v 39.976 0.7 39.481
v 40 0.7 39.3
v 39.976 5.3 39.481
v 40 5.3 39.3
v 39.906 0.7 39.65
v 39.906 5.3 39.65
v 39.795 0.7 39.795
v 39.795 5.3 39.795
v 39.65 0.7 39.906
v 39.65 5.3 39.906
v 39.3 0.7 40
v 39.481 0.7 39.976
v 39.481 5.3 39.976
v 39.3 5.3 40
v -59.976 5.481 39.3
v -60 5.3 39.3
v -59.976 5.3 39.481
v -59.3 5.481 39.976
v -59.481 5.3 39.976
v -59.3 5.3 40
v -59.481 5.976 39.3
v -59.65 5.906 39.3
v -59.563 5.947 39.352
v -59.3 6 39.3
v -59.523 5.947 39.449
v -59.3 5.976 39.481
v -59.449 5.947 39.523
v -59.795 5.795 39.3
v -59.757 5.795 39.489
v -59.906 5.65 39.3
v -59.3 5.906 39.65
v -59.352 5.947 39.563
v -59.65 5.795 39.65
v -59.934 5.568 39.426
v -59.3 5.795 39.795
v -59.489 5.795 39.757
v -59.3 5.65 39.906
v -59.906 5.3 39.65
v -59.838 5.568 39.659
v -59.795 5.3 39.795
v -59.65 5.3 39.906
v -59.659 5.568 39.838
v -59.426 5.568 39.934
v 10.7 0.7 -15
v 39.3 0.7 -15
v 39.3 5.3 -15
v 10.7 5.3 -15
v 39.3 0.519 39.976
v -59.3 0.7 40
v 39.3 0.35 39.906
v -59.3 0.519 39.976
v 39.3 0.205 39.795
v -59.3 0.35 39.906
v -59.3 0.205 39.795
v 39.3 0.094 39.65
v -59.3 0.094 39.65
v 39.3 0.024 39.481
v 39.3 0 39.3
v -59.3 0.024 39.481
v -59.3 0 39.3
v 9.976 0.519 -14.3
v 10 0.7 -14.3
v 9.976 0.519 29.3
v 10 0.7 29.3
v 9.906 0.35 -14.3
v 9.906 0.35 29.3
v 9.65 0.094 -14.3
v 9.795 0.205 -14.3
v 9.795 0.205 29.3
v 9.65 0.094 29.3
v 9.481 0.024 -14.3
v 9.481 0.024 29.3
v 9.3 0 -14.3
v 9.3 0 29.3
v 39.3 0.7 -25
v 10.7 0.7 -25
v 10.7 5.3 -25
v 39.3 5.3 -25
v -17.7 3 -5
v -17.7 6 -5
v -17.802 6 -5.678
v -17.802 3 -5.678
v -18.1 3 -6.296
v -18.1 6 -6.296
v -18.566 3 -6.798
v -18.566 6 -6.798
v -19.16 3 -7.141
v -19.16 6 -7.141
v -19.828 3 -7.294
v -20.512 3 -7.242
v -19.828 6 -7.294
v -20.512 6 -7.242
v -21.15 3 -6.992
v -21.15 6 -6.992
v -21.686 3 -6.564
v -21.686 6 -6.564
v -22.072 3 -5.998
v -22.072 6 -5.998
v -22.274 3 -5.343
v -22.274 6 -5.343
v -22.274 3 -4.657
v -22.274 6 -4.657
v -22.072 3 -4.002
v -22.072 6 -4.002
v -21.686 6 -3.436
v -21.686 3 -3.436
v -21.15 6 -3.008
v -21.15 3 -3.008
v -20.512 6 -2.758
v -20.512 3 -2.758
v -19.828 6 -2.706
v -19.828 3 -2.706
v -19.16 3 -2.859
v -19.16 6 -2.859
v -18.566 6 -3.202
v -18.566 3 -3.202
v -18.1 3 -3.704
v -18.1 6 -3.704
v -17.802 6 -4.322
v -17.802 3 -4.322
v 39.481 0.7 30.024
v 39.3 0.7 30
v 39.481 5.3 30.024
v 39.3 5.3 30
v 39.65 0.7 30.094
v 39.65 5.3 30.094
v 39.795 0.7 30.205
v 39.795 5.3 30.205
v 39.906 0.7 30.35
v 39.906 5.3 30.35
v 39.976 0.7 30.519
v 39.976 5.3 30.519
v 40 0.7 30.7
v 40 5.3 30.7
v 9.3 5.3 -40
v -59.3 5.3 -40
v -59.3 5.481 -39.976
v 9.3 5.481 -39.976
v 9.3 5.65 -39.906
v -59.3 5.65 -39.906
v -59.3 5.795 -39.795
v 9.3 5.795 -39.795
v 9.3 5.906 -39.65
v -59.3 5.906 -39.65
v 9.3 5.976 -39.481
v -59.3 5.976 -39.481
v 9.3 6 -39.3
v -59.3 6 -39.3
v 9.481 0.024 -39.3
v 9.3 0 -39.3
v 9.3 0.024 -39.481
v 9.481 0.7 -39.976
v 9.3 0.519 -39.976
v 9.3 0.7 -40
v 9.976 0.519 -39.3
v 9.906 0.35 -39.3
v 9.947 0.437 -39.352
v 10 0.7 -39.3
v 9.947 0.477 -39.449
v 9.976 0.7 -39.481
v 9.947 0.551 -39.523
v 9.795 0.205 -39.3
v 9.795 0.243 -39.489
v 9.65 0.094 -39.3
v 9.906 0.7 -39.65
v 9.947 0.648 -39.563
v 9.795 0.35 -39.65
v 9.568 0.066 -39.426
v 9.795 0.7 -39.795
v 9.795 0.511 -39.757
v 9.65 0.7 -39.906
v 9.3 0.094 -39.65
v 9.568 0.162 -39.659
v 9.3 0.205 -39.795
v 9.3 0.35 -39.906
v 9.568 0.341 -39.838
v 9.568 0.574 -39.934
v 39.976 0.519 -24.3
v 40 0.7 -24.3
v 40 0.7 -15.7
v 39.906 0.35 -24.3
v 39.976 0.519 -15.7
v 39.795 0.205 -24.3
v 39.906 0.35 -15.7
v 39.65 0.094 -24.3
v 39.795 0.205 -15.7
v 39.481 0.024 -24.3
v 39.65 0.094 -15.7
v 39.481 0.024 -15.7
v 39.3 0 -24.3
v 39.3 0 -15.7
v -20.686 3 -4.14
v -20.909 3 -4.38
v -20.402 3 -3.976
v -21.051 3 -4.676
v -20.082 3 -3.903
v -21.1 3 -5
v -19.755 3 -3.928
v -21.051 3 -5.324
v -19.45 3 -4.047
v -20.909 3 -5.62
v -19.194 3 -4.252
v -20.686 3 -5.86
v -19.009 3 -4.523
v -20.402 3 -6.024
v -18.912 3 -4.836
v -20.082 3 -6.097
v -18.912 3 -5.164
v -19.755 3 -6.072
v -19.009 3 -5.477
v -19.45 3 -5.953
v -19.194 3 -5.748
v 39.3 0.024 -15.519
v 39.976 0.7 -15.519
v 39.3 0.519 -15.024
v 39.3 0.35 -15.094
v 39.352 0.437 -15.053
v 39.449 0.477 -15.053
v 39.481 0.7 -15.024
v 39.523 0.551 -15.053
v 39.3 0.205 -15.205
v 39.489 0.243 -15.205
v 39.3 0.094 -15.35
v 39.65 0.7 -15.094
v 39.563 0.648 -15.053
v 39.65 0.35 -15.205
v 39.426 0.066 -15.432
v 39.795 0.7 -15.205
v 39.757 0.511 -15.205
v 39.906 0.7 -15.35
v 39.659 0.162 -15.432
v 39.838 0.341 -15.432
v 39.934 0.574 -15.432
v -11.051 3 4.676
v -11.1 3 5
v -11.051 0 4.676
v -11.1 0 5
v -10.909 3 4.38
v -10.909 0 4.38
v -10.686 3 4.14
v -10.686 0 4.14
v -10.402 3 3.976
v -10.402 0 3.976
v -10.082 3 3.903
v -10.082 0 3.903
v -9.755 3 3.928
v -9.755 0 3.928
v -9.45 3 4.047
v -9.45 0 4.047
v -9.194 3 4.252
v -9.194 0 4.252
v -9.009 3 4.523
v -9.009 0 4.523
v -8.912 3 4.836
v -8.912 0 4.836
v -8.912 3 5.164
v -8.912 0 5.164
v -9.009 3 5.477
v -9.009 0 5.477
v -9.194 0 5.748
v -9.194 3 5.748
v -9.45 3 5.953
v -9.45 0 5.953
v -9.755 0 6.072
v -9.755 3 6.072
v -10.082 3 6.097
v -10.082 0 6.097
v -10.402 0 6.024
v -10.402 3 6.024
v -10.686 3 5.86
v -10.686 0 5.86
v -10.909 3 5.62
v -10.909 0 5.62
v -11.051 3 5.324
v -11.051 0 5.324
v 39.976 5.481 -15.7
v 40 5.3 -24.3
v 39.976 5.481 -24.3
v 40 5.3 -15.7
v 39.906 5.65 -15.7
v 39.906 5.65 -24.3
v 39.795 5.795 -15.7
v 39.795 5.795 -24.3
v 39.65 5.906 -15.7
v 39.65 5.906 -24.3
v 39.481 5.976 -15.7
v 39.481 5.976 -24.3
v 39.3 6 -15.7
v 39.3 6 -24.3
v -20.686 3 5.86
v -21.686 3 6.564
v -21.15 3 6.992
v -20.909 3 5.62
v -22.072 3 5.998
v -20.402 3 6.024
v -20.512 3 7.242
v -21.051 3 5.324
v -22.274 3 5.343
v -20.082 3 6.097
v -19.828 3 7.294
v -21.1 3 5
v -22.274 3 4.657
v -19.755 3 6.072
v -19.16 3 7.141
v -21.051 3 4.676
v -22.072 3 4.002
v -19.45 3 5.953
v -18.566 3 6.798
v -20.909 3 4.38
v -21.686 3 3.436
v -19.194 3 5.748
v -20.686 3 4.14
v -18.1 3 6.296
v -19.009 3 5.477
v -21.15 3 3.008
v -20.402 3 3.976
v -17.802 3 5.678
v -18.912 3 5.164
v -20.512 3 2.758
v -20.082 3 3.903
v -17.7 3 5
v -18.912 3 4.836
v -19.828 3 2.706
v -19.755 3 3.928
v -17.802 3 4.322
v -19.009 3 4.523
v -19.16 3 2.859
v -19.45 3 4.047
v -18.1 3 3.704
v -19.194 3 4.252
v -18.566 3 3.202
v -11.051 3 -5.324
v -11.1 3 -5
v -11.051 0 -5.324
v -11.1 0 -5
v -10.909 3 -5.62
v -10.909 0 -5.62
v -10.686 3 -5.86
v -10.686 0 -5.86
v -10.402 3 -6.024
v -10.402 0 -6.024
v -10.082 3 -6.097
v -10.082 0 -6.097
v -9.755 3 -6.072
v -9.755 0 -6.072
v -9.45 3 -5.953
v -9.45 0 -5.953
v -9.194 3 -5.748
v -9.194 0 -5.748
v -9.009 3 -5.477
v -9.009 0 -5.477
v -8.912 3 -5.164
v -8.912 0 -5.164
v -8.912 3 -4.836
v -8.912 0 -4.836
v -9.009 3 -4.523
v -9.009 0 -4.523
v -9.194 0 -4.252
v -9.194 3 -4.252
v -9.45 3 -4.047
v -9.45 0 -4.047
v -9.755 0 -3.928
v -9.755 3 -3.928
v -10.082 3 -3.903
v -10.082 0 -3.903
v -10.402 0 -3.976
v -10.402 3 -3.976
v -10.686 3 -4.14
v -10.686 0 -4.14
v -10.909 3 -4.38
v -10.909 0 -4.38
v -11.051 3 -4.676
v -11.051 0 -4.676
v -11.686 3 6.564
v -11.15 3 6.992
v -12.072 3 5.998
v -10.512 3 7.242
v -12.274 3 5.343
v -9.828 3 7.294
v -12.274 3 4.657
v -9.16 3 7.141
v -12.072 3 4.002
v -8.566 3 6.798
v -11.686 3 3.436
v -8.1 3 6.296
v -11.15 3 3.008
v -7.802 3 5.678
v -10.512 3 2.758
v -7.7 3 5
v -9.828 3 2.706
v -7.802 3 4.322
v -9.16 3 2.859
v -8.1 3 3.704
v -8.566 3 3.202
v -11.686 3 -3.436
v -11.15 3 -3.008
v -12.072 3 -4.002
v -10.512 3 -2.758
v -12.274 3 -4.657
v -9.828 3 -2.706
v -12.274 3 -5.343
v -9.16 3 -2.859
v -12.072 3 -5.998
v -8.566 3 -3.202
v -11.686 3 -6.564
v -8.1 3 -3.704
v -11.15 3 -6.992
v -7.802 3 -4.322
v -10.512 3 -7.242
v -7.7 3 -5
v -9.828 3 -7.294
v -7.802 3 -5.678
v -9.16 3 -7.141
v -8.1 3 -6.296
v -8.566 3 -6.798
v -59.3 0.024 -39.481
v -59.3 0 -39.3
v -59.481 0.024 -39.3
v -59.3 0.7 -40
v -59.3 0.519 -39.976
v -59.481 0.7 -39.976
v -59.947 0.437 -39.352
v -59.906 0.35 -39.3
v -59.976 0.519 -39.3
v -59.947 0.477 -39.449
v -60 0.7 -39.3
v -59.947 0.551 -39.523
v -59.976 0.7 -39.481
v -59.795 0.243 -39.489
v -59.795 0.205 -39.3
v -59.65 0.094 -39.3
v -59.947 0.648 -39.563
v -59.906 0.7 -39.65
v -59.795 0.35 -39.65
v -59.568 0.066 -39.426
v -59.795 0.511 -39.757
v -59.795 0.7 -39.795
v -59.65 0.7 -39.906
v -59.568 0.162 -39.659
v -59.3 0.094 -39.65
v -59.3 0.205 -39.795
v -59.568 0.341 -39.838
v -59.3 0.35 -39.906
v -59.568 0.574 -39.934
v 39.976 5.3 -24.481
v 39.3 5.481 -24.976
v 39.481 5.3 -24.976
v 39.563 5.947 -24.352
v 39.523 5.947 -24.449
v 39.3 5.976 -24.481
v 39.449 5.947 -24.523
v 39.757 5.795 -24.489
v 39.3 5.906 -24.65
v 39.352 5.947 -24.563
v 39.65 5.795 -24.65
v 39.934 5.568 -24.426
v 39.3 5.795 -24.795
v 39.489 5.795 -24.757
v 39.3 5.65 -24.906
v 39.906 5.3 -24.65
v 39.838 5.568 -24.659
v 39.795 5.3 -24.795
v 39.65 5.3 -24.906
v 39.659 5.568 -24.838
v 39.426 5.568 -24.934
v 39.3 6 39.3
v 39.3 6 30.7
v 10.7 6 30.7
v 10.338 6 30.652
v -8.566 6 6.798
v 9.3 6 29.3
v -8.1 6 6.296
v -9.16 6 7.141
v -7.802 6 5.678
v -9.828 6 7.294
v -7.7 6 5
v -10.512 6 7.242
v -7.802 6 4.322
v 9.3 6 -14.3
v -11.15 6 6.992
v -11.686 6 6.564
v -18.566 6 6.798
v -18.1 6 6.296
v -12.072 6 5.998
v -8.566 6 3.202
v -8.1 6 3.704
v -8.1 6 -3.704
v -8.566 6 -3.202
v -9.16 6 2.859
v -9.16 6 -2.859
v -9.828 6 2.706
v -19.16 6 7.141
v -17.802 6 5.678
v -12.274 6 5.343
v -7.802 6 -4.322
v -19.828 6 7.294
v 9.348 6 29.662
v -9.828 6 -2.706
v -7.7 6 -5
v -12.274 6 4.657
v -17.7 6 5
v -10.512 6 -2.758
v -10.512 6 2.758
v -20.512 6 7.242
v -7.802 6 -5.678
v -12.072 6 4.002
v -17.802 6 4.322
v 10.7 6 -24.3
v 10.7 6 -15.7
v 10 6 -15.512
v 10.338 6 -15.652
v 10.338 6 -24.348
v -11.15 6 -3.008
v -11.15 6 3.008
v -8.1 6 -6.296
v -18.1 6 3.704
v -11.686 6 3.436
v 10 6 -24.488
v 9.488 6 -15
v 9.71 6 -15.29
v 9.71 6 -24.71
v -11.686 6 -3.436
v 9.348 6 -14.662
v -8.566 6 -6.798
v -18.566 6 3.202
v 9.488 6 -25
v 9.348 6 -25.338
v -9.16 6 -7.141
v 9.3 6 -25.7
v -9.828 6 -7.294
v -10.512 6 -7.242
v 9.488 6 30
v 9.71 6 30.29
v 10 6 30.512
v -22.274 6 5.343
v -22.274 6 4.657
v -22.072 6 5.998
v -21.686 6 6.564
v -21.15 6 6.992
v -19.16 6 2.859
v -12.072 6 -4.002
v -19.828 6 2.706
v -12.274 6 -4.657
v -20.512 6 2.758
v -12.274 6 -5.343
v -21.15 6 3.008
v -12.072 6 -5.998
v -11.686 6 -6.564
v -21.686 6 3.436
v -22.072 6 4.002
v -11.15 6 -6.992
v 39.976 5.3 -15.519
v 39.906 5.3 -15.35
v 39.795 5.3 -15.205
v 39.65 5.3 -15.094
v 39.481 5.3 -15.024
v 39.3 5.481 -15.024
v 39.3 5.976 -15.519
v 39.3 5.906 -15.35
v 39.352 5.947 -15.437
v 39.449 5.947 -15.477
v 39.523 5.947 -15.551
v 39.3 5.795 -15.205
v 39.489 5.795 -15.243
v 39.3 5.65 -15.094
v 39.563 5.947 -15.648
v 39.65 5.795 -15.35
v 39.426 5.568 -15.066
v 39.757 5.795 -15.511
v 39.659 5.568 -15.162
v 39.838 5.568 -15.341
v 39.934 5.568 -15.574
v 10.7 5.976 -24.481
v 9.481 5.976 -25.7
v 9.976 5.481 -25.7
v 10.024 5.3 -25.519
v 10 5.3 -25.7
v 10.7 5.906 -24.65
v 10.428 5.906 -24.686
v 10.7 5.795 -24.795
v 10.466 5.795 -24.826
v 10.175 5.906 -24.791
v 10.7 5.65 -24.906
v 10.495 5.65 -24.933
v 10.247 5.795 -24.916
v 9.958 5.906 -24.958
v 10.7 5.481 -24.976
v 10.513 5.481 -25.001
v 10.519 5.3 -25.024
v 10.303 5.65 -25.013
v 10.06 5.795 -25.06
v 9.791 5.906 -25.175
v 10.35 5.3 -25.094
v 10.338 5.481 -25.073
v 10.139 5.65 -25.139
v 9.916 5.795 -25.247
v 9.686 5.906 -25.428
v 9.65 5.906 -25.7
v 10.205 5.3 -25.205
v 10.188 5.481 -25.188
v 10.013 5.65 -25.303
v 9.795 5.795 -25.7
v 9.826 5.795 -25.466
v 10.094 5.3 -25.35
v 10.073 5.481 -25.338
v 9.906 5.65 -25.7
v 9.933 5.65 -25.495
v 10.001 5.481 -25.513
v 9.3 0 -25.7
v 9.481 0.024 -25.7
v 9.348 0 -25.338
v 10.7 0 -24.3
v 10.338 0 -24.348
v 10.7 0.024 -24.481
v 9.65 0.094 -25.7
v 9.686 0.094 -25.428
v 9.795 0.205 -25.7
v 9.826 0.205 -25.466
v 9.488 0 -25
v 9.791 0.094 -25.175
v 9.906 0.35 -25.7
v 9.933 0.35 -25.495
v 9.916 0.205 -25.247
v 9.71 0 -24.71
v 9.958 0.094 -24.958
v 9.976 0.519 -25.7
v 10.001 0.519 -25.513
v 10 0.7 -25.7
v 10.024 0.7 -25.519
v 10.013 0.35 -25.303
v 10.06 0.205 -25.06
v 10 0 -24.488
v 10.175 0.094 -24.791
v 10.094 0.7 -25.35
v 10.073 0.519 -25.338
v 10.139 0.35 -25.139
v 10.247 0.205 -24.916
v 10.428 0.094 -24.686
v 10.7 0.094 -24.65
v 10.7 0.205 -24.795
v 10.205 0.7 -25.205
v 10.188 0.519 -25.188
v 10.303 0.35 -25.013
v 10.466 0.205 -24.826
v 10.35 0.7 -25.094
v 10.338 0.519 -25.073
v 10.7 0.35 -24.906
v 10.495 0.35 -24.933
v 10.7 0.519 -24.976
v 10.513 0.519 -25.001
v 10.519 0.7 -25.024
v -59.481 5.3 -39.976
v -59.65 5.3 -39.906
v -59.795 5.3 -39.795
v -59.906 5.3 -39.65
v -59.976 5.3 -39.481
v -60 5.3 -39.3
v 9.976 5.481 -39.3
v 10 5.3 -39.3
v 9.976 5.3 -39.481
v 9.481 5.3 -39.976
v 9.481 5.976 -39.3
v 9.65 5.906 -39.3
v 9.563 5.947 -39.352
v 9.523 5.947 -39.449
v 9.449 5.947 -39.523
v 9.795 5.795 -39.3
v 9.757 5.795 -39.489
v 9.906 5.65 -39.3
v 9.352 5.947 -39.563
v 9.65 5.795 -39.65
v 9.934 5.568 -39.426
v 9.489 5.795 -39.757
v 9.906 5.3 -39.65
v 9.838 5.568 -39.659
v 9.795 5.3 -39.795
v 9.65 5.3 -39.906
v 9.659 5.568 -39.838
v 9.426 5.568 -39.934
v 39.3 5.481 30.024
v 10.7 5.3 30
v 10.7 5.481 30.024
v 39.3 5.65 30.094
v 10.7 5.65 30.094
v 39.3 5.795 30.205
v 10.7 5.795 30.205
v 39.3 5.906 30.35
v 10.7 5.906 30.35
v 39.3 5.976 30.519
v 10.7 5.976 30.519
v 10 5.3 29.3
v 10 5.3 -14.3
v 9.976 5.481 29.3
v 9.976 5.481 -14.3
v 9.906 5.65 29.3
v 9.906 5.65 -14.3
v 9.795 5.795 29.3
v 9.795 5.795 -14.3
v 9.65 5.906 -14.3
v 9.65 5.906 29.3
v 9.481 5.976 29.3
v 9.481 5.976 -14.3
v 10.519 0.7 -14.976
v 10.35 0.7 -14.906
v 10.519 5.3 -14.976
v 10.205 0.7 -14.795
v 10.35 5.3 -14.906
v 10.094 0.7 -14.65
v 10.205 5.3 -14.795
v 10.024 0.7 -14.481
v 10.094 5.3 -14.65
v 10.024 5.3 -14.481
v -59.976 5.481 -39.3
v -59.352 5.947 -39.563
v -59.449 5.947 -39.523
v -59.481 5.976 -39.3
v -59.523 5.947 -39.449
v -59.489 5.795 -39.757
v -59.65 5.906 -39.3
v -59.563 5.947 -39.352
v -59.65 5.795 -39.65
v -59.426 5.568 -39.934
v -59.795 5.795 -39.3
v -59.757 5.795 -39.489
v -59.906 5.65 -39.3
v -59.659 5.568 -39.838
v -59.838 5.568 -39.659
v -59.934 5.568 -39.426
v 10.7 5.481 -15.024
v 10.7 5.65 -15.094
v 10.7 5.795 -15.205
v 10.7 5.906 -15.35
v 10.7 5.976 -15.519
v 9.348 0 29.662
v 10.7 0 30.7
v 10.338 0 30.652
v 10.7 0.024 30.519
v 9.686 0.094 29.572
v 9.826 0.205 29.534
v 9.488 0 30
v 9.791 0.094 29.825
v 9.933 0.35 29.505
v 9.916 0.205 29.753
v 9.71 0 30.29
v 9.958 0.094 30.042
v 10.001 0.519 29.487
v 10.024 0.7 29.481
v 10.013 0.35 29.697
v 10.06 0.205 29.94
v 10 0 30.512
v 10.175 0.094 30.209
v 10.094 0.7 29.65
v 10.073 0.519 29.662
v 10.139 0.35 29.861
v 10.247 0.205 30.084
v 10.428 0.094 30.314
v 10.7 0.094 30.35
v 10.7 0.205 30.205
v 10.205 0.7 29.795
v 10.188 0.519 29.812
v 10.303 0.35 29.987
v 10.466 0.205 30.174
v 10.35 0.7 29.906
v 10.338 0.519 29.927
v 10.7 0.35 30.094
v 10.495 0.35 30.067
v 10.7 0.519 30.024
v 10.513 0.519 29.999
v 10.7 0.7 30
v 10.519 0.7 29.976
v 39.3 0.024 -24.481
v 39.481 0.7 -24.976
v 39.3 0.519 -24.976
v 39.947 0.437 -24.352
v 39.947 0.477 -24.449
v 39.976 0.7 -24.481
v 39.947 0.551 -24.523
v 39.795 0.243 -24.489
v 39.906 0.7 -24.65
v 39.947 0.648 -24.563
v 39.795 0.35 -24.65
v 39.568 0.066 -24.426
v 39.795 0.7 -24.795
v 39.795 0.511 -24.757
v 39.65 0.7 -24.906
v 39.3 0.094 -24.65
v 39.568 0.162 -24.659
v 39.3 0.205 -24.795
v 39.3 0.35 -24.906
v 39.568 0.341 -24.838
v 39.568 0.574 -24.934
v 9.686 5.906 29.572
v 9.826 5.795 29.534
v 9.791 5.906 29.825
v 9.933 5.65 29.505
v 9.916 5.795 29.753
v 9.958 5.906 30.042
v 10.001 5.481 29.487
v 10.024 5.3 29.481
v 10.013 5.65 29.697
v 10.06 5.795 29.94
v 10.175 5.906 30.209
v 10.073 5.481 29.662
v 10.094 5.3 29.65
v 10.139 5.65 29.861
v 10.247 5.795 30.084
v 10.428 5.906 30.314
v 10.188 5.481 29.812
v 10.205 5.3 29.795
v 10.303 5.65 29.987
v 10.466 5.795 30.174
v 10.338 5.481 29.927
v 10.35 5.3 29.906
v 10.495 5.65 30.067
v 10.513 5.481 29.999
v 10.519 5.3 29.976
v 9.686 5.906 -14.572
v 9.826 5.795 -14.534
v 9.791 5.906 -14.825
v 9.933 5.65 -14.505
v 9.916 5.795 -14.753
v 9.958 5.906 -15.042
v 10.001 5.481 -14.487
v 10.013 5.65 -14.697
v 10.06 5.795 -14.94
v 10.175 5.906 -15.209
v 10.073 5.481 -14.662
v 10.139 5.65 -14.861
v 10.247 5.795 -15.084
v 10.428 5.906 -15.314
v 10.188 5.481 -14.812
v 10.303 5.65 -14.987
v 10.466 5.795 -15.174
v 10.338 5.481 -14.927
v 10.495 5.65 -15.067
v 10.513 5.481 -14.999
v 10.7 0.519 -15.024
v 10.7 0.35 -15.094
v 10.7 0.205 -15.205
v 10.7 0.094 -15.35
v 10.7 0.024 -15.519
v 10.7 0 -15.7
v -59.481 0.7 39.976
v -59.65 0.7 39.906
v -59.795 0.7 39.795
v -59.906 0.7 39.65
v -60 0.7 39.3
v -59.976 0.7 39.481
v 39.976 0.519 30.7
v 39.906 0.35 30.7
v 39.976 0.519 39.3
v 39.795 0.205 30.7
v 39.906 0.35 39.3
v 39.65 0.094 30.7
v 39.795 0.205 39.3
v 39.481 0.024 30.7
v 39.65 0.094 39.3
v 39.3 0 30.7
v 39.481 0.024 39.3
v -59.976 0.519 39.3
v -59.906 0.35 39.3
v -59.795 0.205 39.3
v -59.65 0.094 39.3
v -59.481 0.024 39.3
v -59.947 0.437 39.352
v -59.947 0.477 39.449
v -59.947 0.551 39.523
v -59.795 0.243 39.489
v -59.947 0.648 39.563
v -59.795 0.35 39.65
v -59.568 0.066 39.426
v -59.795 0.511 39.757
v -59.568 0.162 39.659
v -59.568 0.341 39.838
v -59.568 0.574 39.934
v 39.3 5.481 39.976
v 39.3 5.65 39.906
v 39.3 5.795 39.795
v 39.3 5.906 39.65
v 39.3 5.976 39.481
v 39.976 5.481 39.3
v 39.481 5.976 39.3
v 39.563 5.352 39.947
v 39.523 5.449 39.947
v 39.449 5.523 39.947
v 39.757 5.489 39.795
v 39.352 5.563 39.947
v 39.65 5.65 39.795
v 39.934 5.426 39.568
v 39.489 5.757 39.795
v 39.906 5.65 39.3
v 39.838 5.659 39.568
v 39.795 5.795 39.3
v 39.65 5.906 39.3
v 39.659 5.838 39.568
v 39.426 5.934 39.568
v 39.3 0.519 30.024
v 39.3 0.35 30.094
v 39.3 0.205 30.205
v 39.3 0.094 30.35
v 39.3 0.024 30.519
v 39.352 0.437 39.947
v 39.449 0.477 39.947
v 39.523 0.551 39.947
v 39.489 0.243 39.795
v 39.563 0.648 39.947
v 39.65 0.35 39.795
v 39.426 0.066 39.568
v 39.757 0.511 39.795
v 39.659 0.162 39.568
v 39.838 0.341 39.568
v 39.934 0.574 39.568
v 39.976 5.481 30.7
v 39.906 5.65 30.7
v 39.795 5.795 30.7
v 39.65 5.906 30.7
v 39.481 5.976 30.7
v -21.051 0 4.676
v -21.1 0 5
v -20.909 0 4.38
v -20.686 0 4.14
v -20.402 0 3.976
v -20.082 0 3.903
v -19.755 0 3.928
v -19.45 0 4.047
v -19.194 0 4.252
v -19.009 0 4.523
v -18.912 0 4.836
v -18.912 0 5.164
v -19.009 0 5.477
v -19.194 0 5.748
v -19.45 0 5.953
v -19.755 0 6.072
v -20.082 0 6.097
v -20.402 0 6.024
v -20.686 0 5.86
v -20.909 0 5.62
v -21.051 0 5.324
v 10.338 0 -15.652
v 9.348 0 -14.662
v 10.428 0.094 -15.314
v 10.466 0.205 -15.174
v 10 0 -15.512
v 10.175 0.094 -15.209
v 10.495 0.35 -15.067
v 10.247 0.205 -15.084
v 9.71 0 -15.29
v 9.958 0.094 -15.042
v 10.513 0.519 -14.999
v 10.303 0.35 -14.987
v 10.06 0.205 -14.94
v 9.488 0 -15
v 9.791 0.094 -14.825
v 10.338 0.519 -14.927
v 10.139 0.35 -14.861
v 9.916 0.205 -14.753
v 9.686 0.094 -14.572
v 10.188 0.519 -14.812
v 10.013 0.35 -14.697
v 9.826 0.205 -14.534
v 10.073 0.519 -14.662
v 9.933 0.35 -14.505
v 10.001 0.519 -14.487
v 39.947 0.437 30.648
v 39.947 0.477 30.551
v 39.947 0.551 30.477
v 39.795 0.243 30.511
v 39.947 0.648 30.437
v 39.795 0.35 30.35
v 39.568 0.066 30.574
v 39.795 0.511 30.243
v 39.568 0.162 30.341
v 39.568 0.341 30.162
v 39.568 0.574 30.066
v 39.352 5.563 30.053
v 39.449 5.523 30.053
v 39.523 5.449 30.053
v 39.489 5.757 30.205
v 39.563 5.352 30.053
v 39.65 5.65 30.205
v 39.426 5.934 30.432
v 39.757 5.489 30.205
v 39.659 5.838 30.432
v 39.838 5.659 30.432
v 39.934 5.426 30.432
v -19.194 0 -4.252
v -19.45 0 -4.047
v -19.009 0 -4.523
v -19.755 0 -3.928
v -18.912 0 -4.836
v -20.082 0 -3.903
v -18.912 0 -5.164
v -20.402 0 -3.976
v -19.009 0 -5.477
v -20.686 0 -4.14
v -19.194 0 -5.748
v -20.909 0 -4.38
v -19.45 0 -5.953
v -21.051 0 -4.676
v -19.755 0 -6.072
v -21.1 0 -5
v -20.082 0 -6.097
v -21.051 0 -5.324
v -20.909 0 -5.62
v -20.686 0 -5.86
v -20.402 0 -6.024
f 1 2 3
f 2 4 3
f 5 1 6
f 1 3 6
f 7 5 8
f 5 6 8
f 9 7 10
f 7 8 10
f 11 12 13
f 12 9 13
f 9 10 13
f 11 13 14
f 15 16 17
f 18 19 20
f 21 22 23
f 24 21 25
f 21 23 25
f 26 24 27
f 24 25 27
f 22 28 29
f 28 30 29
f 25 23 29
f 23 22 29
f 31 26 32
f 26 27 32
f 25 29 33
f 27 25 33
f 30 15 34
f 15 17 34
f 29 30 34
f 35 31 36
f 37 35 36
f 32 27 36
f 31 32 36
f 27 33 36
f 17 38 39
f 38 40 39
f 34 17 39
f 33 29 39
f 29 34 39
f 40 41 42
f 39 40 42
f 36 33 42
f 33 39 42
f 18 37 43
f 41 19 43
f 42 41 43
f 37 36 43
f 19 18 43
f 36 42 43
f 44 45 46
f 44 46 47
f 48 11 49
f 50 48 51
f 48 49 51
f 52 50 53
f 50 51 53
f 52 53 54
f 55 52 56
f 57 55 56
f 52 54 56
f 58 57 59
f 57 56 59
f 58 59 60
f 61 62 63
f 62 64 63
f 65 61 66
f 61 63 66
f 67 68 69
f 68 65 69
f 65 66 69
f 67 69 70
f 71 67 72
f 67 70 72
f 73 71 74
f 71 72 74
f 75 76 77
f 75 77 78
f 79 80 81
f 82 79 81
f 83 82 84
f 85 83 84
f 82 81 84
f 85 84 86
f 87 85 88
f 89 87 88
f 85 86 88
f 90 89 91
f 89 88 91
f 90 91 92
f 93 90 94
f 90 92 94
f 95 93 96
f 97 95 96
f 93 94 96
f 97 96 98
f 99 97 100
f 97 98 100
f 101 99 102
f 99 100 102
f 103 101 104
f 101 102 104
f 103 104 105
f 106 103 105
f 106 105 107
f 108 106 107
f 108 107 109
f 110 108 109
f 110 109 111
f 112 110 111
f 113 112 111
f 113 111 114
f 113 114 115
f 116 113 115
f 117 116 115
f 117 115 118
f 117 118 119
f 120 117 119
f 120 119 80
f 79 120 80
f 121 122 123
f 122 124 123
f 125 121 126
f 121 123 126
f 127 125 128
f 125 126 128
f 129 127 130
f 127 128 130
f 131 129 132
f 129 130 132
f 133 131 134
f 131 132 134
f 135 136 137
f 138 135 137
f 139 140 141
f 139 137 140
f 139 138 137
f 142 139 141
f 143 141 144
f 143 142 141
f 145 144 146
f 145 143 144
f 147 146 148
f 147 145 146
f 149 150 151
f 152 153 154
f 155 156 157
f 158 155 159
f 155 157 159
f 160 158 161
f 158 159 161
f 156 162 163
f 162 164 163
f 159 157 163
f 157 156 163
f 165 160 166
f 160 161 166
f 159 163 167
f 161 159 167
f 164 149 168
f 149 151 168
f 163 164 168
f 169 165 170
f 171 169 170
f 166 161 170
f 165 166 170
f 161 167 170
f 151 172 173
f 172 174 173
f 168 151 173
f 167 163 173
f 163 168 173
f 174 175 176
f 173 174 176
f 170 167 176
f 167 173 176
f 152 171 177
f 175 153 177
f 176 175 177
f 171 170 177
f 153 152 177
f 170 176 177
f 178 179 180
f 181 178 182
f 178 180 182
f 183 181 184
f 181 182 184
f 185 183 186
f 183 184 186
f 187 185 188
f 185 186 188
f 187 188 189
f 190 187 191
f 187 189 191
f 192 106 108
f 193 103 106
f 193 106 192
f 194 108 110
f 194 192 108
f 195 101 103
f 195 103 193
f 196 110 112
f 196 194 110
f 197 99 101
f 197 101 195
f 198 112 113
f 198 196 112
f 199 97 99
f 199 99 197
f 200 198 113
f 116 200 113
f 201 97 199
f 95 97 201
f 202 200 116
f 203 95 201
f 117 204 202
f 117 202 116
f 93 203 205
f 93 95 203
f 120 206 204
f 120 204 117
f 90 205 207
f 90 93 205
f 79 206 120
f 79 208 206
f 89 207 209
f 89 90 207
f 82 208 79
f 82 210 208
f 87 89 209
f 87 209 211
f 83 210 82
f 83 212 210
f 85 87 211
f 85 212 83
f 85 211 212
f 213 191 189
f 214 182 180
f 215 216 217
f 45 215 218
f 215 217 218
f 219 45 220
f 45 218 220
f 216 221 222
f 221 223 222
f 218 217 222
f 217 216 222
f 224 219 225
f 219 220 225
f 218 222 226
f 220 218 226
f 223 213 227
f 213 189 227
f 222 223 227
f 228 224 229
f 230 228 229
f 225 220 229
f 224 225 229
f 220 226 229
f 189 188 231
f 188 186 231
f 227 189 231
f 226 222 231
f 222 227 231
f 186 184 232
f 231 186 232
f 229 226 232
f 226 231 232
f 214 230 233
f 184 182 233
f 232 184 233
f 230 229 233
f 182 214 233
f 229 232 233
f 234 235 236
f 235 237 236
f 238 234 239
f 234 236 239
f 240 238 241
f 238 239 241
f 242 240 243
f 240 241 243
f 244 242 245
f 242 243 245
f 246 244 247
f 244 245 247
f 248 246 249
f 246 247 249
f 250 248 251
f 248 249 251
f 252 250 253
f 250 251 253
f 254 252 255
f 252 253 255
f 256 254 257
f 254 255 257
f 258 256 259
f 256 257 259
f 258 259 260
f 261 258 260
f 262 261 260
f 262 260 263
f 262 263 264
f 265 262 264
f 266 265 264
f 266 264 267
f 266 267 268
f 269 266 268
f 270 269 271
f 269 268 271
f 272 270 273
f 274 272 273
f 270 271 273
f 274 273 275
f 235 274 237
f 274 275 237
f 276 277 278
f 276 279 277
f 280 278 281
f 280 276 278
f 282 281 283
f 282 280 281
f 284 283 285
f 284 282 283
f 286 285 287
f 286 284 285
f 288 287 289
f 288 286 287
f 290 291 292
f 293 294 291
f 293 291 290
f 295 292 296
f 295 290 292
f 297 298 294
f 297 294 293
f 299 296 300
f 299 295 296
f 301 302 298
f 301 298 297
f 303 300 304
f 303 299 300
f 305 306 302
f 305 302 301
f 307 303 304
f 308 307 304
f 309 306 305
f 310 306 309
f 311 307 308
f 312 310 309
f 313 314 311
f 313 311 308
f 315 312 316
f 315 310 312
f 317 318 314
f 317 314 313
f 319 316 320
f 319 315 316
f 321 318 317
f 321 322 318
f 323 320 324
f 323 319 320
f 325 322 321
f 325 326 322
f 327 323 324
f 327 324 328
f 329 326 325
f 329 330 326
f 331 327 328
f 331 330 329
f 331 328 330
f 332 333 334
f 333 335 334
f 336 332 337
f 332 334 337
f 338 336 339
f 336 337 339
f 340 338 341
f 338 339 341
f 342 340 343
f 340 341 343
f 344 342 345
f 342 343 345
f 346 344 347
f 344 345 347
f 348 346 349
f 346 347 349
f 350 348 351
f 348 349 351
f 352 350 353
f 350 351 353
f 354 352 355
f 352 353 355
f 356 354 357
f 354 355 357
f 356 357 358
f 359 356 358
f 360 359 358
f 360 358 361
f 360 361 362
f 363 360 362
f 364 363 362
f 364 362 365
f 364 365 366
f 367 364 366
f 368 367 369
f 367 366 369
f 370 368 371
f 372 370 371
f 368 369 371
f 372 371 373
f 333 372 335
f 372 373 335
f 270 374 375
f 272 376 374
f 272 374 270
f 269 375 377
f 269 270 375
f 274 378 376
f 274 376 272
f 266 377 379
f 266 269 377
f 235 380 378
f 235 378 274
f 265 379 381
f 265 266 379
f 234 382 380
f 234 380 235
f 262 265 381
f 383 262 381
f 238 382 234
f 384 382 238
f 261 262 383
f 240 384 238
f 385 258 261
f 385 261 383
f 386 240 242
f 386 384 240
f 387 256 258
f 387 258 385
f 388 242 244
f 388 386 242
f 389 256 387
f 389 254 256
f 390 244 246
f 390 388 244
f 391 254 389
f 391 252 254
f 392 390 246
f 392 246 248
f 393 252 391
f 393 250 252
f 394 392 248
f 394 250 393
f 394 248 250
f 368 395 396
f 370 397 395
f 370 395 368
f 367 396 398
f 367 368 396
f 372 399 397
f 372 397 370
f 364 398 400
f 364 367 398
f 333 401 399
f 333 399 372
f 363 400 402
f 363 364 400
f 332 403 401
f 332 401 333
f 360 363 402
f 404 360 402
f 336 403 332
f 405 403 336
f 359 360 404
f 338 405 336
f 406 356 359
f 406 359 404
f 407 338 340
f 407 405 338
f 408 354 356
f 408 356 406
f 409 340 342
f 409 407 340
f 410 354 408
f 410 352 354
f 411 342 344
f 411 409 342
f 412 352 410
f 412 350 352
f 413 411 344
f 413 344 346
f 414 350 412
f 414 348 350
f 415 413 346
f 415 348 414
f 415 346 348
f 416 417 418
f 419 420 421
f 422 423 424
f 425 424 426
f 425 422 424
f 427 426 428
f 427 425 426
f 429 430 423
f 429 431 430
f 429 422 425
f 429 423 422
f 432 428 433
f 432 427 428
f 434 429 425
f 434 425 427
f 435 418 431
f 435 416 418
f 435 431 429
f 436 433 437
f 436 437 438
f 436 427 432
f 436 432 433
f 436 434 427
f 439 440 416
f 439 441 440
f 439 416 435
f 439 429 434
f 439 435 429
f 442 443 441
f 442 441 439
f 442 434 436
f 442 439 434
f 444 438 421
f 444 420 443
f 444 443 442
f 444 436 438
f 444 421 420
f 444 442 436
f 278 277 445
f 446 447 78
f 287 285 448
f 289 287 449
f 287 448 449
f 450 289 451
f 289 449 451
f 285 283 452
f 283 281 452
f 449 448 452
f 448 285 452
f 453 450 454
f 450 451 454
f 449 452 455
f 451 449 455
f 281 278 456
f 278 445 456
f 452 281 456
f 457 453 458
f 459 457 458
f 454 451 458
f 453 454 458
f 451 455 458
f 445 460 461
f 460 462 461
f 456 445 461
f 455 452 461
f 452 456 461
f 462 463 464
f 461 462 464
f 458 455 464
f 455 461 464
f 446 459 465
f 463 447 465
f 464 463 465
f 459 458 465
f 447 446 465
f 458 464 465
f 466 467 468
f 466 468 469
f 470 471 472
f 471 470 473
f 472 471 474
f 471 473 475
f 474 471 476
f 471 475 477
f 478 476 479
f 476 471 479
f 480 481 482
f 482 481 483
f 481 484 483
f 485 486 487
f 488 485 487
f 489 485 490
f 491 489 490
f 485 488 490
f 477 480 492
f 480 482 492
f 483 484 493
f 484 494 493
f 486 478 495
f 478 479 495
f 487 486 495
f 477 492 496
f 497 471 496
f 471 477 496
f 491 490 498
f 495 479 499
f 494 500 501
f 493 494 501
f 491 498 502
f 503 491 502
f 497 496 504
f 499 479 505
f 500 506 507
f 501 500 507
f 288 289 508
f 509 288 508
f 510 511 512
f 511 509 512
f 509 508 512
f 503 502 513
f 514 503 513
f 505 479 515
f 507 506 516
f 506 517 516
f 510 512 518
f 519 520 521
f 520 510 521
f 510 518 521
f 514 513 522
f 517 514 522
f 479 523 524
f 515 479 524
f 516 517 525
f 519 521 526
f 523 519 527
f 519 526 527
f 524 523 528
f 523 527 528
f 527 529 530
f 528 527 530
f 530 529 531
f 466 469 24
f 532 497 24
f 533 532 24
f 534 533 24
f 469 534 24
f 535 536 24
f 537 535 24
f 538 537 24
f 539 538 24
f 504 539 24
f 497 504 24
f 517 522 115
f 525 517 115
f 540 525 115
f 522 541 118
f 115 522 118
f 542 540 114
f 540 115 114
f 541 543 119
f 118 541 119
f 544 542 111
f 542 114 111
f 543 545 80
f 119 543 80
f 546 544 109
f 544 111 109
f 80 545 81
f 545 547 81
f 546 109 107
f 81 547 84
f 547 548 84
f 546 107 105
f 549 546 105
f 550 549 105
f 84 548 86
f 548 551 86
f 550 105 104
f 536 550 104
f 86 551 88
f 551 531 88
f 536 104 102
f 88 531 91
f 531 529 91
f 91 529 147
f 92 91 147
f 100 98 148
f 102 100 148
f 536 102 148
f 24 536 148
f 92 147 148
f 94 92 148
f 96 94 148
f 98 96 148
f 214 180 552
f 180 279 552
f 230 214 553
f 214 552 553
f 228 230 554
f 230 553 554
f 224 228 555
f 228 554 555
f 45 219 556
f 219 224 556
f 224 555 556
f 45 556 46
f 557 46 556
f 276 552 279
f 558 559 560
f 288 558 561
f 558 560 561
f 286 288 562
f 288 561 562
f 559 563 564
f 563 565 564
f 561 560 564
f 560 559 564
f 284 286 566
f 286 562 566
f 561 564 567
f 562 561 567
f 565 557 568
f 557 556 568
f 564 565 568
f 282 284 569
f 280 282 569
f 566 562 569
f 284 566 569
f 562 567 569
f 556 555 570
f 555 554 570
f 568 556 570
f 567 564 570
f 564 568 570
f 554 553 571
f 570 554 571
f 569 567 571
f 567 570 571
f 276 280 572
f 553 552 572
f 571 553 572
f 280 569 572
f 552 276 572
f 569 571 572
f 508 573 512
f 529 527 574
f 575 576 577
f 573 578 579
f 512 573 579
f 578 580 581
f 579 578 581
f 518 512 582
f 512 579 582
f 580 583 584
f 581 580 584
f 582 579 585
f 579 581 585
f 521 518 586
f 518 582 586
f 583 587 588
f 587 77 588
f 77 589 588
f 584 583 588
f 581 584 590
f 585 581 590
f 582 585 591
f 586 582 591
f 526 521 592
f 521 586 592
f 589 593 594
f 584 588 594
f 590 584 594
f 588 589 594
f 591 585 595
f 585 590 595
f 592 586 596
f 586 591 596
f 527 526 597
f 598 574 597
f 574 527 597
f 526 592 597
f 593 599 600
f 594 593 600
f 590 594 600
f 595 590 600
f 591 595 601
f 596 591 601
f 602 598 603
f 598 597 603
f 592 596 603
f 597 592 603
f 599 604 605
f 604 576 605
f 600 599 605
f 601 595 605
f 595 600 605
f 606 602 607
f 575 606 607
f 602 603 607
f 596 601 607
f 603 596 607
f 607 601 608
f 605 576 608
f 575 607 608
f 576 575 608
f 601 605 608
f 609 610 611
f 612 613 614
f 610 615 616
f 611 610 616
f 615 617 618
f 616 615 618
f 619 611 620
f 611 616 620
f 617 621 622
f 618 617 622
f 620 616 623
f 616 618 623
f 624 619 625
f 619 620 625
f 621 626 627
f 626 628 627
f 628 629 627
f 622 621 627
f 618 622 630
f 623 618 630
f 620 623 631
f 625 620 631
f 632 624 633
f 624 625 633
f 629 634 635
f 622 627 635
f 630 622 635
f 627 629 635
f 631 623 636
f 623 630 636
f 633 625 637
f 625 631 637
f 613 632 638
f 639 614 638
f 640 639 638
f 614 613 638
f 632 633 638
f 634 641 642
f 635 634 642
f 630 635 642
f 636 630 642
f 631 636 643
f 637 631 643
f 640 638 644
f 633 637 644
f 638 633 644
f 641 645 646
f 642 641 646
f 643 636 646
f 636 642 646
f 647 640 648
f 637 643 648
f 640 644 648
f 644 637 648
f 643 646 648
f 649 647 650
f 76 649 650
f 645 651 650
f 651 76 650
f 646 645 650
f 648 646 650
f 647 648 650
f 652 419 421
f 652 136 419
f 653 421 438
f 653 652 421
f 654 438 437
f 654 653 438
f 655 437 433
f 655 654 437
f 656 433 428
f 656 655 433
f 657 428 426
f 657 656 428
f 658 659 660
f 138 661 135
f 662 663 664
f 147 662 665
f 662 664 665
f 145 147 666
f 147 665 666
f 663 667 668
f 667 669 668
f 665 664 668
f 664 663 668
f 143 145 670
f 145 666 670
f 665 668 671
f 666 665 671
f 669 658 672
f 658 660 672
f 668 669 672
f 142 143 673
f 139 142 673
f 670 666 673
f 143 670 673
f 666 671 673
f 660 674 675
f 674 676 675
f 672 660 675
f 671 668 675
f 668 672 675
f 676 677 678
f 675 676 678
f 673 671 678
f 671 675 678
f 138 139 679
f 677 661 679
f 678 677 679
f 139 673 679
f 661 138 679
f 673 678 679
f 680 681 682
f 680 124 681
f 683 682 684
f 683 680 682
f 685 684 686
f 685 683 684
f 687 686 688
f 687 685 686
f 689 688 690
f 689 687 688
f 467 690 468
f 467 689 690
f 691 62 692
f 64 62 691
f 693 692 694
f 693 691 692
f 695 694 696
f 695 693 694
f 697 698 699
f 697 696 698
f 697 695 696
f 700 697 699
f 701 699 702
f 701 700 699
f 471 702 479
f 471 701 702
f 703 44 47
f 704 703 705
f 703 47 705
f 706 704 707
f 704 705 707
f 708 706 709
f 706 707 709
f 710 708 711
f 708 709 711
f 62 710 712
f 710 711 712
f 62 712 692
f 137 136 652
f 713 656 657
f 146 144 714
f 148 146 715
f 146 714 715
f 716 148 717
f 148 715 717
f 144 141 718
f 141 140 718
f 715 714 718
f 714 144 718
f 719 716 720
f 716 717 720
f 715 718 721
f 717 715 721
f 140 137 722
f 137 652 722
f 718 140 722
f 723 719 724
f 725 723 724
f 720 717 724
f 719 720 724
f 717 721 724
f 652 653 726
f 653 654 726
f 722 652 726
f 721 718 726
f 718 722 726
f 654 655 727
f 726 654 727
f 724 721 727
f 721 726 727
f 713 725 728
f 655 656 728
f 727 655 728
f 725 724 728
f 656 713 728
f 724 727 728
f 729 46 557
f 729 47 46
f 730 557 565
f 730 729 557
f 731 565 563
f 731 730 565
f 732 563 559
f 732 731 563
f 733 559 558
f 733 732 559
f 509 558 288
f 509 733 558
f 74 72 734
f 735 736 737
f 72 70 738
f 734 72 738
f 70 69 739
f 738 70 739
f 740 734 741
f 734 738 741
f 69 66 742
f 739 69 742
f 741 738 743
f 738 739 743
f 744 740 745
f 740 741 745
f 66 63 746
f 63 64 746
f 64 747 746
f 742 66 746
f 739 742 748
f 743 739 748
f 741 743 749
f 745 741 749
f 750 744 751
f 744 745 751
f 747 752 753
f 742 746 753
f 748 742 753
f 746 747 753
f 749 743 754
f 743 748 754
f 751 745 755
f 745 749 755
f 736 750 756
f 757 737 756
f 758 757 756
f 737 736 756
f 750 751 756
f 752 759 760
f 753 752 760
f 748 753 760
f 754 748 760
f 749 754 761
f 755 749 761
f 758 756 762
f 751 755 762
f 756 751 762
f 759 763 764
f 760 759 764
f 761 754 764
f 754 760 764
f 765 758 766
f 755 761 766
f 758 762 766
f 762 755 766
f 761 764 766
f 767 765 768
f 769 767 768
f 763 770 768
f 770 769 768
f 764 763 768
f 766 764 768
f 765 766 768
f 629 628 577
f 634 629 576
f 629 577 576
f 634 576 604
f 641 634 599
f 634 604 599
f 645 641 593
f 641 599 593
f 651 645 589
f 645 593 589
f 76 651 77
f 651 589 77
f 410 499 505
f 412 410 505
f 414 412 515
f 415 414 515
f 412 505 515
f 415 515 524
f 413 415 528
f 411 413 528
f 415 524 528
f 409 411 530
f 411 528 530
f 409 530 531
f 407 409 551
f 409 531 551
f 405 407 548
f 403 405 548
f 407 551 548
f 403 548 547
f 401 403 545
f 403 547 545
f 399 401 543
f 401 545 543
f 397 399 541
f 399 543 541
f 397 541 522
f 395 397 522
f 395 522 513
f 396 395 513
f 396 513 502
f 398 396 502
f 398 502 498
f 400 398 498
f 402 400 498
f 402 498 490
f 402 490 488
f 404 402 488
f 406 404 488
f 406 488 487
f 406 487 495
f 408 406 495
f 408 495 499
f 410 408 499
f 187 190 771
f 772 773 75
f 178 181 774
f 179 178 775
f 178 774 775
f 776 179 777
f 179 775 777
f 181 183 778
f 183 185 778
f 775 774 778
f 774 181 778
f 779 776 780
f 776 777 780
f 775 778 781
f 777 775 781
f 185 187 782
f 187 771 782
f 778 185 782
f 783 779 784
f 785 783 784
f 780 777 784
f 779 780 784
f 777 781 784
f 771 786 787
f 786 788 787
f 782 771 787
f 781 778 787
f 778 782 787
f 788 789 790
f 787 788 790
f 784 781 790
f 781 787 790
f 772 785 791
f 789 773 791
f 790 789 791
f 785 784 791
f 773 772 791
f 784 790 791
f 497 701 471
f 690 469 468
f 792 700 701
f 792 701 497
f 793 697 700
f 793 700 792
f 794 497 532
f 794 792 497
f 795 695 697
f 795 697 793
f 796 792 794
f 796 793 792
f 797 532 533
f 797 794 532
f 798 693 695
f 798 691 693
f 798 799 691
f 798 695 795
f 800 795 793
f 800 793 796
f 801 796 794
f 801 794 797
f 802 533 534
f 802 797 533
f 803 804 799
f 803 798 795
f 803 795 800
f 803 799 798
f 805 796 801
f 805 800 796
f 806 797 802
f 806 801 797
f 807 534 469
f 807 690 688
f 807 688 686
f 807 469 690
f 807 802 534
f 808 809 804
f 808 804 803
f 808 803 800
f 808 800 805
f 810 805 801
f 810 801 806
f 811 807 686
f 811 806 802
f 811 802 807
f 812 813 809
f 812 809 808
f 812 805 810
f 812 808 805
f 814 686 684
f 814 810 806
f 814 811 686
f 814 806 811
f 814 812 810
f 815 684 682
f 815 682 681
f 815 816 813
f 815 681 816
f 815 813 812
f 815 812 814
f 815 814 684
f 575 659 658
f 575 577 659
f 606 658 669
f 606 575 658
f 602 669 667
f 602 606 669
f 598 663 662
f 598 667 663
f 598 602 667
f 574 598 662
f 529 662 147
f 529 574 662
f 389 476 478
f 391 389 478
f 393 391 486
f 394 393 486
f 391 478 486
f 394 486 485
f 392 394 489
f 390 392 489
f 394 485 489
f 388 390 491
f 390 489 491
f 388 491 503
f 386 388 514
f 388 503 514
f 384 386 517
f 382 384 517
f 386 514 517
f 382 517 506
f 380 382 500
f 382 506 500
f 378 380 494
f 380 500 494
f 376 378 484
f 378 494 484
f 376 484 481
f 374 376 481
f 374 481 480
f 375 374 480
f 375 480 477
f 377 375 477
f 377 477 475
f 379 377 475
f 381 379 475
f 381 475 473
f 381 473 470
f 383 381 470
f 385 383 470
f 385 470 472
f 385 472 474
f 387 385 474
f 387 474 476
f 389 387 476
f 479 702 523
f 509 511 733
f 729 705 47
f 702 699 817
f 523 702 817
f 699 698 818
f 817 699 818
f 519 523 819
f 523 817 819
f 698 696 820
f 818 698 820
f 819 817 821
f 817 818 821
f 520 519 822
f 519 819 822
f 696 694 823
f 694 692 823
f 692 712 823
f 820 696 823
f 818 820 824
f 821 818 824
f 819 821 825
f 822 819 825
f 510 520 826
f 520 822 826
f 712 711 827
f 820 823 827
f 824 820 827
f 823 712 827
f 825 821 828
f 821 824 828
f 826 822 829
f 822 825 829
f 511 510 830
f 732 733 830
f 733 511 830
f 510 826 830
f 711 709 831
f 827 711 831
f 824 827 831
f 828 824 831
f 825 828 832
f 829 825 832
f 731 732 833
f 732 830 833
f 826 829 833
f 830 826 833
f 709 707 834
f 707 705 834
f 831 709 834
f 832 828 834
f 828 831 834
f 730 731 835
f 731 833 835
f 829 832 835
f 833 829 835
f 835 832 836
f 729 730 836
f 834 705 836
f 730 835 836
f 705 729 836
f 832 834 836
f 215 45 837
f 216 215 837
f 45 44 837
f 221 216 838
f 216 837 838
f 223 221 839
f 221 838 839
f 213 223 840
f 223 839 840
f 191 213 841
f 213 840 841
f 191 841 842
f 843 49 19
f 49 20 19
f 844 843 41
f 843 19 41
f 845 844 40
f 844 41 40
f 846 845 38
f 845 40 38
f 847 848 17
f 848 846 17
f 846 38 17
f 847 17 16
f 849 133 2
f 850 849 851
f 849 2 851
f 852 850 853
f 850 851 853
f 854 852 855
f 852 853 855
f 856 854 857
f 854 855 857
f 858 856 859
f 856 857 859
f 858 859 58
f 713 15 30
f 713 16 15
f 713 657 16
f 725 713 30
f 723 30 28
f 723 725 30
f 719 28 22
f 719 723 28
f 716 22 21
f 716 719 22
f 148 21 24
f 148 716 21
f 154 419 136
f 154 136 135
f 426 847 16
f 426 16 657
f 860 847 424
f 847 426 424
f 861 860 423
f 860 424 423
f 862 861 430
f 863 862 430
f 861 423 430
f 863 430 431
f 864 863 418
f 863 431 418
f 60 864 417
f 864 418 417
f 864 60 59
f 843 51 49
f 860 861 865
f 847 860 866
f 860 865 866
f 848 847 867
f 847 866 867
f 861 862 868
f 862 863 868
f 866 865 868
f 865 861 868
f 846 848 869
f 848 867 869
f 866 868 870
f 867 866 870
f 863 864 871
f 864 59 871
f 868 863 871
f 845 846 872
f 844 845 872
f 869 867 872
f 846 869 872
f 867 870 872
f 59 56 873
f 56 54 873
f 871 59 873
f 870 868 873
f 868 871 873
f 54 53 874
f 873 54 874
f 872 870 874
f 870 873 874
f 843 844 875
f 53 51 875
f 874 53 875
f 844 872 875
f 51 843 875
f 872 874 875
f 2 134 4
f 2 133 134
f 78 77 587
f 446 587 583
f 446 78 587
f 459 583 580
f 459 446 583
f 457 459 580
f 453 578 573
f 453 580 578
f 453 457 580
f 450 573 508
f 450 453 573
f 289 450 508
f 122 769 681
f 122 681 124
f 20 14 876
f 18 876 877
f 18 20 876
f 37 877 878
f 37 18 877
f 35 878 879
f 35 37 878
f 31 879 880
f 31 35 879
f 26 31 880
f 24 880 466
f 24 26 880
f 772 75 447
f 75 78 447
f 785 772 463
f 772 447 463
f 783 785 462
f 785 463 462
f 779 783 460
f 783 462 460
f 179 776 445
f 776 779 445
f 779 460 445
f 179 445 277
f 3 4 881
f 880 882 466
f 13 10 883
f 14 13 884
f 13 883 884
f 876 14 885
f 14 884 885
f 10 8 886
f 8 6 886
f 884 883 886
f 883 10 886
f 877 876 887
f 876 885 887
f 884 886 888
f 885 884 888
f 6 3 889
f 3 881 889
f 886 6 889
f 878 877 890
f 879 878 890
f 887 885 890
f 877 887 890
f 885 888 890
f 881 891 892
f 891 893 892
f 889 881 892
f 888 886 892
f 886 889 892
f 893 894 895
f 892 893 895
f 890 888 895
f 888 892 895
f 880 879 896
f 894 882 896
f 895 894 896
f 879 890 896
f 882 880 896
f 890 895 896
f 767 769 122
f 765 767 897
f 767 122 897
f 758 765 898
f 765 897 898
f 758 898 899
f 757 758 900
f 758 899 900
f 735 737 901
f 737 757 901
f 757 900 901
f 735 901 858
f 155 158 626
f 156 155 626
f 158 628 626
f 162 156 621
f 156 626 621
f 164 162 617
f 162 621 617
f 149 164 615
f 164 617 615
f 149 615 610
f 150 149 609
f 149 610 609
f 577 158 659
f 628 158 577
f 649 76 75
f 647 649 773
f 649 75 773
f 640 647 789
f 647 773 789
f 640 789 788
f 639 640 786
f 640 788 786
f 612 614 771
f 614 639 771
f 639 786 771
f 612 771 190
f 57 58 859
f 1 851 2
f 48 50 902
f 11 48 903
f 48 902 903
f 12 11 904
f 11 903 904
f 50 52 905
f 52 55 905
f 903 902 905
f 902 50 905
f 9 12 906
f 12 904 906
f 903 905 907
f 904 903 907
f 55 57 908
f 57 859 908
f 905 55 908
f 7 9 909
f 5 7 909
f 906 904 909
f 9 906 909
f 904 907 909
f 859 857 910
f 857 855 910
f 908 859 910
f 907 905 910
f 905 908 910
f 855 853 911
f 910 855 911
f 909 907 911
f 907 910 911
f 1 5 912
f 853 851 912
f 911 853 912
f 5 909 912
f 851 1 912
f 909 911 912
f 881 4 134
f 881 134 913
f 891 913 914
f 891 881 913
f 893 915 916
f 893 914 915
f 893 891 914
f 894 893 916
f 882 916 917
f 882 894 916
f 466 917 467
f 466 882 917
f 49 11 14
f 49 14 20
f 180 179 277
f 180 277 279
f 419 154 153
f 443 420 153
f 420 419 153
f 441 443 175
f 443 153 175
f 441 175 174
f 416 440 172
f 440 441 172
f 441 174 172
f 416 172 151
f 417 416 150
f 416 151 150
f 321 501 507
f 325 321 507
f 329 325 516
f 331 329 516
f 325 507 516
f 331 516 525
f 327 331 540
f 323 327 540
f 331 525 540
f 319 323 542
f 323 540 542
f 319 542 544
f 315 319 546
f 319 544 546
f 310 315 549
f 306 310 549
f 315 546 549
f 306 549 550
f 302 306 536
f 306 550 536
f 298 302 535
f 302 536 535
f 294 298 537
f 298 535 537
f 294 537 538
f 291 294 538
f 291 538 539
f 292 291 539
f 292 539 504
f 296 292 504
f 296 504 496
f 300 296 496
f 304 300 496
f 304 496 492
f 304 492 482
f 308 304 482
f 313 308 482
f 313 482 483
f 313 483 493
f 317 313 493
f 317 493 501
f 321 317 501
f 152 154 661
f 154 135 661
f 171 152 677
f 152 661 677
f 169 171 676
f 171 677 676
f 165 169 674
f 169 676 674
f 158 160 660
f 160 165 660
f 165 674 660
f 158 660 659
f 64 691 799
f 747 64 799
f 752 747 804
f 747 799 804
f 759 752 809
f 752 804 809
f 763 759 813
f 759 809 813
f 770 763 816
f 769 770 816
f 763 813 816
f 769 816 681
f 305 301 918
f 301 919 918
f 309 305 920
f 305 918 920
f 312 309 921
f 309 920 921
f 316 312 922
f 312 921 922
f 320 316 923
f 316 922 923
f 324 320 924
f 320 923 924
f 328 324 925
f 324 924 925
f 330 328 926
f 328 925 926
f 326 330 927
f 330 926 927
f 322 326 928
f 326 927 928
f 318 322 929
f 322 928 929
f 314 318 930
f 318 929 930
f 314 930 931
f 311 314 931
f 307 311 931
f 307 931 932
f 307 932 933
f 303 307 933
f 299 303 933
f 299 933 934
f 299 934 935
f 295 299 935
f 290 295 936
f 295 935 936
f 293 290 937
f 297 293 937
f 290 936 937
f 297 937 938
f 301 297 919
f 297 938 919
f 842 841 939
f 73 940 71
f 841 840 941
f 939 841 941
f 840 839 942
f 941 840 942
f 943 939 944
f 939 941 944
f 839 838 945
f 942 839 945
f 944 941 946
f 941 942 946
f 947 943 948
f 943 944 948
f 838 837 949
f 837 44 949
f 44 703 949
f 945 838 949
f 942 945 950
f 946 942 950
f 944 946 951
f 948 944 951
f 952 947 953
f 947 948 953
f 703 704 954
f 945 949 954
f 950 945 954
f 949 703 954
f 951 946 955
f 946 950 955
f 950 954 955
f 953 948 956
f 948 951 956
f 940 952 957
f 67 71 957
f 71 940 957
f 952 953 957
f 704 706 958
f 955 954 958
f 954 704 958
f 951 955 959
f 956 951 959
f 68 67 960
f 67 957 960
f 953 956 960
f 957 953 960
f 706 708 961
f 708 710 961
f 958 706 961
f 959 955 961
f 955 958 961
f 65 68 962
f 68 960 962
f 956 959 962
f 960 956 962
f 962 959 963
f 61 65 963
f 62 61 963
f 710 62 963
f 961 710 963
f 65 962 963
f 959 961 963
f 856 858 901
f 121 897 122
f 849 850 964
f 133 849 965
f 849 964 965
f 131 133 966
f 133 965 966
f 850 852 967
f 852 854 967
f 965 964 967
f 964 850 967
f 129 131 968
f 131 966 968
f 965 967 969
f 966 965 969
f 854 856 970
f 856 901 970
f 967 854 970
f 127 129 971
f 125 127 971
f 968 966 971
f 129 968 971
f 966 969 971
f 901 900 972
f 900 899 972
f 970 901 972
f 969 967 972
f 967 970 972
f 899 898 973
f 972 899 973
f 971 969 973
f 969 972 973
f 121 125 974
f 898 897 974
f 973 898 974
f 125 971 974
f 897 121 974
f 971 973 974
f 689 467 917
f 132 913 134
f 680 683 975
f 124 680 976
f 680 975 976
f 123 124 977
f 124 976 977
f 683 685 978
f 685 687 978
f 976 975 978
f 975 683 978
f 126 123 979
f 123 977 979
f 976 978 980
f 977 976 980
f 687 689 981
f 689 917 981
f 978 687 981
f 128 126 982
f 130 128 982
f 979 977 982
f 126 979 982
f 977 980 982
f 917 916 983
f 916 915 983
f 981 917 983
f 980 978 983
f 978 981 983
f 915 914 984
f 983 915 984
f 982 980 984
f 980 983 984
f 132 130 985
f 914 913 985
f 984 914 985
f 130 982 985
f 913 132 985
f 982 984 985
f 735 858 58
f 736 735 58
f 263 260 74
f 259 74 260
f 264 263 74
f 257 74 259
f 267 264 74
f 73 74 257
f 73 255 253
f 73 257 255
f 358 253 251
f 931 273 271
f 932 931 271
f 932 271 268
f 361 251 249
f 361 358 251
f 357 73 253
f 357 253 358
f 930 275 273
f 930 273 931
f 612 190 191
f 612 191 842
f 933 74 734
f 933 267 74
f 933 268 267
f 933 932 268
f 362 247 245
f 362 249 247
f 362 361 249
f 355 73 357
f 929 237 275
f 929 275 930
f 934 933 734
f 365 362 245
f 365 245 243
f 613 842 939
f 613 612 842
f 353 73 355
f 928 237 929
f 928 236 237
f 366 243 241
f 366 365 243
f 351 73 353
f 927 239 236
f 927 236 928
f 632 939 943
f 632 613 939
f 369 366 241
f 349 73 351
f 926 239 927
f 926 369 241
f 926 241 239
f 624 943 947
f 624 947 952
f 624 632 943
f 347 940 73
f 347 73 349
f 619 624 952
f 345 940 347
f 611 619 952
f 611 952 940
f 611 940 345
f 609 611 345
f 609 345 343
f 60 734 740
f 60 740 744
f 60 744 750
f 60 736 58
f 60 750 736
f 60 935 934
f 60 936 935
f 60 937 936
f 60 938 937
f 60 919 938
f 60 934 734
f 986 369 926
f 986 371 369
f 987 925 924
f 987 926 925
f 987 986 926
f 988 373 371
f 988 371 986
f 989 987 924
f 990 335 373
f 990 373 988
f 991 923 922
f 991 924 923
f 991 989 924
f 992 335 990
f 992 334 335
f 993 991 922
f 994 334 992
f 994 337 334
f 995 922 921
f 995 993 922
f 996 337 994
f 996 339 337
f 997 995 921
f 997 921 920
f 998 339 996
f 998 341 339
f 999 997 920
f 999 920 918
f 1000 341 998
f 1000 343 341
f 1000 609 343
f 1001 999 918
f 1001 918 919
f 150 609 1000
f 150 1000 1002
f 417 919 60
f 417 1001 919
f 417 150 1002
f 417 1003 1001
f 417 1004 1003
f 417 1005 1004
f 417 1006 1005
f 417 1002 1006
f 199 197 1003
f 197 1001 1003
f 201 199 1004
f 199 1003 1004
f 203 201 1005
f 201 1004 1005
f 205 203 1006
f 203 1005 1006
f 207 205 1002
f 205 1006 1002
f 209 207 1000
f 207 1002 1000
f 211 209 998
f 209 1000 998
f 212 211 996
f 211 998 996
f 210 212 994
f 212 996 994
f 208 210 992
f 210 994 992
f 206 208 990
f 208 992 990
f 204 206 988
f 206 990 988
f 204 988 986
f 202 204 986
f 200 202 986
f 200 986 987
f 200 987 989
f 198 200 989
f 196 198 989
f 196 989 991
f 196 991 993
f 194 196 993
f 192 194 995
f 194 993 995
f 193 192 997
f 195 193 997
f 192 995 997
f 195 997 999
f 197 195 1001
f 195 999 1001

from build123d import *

# Parameters (mm, degrees)
EXTRUDE_1_DEPTH              = 6
FILLET_2_R                   = 0.7
HOLE_WIZARD_M2_1_D           = 2.2
HOLE_WIZARD_M2_1_CBORE_D     = 4.6
HOLE_WIZARD_M2_1_CBORE_DEPTH = 3


with BuildPart() as part:
    # 草图1 → 凸台-拉伸1 (new body)
    with BuildSketch(Plane(origin=(0, 0, 0), x_dir=(1, 0, 0), z_dir=(0, 1, 0))):
        Polygon((-60, 40), (10, 40), (10, 25), (40, 25), (40, 15), (10, 15), (10, -30), (40, -30), (40, -40), (-60, -40), align=None)
    extrude(amount=EXTRUDE_1_DEPTH)

    # 圆角2
    fillet_2_edges = [part.edges().sort_by_distance(p)[0] for p in [
        (-25, 0, -40),
        (10, 0, -32.5),
        (25, 0, -25),
        (40, 0, -20),
        (25, 0, -15),
        (10, 0, 7.5),
        (25, 0, 30),
        (40, 6, 35),
        (40, 0, 35),
        (-10, 0, 40),
        (-60, 0, 0),
        (25, 6, 30),
        (-60, 3, -40),
        (10, 3, -40),
        (10, 3, -25),
        (40, 3, -25),
        (40, 3, -15),
        (10, 3, -15),
        (10, 3, 30),
        (40, 3, 30),
        (40, 3, 40),
        (-60, 3, 40),
        (10, 6, 7.5),
        (25, 6, -15),
        (40, 6, -20),
        (25, 6, -25),
        (10, 6, -32.5),
        (-25, 6, -40),
        (-60, 6, 0),
        (-10, 6, 40),
    ]]
    fillet(fillet_2_edges, radius=FILLET_2_R)

    # M2 六角头机械螺钉的柱形沉头孔1 (through all)
    with Locations(Plane(origin=(0, 6, 0), x_dir=(1, 0, 0), z_dir=(0, 1, 0))):
        with Locations((-20, 5), (-10, 5), (-10, -5), (-20, -5)):
            CounterBoreHole(HOLE_WIZARD_M2_1_D / 2, HOLE_WIZARD_M2_1_CBORE_D / 2, HOLE_WIZARD_M2_1_CBORE_DEPTH)


solid = part.part
